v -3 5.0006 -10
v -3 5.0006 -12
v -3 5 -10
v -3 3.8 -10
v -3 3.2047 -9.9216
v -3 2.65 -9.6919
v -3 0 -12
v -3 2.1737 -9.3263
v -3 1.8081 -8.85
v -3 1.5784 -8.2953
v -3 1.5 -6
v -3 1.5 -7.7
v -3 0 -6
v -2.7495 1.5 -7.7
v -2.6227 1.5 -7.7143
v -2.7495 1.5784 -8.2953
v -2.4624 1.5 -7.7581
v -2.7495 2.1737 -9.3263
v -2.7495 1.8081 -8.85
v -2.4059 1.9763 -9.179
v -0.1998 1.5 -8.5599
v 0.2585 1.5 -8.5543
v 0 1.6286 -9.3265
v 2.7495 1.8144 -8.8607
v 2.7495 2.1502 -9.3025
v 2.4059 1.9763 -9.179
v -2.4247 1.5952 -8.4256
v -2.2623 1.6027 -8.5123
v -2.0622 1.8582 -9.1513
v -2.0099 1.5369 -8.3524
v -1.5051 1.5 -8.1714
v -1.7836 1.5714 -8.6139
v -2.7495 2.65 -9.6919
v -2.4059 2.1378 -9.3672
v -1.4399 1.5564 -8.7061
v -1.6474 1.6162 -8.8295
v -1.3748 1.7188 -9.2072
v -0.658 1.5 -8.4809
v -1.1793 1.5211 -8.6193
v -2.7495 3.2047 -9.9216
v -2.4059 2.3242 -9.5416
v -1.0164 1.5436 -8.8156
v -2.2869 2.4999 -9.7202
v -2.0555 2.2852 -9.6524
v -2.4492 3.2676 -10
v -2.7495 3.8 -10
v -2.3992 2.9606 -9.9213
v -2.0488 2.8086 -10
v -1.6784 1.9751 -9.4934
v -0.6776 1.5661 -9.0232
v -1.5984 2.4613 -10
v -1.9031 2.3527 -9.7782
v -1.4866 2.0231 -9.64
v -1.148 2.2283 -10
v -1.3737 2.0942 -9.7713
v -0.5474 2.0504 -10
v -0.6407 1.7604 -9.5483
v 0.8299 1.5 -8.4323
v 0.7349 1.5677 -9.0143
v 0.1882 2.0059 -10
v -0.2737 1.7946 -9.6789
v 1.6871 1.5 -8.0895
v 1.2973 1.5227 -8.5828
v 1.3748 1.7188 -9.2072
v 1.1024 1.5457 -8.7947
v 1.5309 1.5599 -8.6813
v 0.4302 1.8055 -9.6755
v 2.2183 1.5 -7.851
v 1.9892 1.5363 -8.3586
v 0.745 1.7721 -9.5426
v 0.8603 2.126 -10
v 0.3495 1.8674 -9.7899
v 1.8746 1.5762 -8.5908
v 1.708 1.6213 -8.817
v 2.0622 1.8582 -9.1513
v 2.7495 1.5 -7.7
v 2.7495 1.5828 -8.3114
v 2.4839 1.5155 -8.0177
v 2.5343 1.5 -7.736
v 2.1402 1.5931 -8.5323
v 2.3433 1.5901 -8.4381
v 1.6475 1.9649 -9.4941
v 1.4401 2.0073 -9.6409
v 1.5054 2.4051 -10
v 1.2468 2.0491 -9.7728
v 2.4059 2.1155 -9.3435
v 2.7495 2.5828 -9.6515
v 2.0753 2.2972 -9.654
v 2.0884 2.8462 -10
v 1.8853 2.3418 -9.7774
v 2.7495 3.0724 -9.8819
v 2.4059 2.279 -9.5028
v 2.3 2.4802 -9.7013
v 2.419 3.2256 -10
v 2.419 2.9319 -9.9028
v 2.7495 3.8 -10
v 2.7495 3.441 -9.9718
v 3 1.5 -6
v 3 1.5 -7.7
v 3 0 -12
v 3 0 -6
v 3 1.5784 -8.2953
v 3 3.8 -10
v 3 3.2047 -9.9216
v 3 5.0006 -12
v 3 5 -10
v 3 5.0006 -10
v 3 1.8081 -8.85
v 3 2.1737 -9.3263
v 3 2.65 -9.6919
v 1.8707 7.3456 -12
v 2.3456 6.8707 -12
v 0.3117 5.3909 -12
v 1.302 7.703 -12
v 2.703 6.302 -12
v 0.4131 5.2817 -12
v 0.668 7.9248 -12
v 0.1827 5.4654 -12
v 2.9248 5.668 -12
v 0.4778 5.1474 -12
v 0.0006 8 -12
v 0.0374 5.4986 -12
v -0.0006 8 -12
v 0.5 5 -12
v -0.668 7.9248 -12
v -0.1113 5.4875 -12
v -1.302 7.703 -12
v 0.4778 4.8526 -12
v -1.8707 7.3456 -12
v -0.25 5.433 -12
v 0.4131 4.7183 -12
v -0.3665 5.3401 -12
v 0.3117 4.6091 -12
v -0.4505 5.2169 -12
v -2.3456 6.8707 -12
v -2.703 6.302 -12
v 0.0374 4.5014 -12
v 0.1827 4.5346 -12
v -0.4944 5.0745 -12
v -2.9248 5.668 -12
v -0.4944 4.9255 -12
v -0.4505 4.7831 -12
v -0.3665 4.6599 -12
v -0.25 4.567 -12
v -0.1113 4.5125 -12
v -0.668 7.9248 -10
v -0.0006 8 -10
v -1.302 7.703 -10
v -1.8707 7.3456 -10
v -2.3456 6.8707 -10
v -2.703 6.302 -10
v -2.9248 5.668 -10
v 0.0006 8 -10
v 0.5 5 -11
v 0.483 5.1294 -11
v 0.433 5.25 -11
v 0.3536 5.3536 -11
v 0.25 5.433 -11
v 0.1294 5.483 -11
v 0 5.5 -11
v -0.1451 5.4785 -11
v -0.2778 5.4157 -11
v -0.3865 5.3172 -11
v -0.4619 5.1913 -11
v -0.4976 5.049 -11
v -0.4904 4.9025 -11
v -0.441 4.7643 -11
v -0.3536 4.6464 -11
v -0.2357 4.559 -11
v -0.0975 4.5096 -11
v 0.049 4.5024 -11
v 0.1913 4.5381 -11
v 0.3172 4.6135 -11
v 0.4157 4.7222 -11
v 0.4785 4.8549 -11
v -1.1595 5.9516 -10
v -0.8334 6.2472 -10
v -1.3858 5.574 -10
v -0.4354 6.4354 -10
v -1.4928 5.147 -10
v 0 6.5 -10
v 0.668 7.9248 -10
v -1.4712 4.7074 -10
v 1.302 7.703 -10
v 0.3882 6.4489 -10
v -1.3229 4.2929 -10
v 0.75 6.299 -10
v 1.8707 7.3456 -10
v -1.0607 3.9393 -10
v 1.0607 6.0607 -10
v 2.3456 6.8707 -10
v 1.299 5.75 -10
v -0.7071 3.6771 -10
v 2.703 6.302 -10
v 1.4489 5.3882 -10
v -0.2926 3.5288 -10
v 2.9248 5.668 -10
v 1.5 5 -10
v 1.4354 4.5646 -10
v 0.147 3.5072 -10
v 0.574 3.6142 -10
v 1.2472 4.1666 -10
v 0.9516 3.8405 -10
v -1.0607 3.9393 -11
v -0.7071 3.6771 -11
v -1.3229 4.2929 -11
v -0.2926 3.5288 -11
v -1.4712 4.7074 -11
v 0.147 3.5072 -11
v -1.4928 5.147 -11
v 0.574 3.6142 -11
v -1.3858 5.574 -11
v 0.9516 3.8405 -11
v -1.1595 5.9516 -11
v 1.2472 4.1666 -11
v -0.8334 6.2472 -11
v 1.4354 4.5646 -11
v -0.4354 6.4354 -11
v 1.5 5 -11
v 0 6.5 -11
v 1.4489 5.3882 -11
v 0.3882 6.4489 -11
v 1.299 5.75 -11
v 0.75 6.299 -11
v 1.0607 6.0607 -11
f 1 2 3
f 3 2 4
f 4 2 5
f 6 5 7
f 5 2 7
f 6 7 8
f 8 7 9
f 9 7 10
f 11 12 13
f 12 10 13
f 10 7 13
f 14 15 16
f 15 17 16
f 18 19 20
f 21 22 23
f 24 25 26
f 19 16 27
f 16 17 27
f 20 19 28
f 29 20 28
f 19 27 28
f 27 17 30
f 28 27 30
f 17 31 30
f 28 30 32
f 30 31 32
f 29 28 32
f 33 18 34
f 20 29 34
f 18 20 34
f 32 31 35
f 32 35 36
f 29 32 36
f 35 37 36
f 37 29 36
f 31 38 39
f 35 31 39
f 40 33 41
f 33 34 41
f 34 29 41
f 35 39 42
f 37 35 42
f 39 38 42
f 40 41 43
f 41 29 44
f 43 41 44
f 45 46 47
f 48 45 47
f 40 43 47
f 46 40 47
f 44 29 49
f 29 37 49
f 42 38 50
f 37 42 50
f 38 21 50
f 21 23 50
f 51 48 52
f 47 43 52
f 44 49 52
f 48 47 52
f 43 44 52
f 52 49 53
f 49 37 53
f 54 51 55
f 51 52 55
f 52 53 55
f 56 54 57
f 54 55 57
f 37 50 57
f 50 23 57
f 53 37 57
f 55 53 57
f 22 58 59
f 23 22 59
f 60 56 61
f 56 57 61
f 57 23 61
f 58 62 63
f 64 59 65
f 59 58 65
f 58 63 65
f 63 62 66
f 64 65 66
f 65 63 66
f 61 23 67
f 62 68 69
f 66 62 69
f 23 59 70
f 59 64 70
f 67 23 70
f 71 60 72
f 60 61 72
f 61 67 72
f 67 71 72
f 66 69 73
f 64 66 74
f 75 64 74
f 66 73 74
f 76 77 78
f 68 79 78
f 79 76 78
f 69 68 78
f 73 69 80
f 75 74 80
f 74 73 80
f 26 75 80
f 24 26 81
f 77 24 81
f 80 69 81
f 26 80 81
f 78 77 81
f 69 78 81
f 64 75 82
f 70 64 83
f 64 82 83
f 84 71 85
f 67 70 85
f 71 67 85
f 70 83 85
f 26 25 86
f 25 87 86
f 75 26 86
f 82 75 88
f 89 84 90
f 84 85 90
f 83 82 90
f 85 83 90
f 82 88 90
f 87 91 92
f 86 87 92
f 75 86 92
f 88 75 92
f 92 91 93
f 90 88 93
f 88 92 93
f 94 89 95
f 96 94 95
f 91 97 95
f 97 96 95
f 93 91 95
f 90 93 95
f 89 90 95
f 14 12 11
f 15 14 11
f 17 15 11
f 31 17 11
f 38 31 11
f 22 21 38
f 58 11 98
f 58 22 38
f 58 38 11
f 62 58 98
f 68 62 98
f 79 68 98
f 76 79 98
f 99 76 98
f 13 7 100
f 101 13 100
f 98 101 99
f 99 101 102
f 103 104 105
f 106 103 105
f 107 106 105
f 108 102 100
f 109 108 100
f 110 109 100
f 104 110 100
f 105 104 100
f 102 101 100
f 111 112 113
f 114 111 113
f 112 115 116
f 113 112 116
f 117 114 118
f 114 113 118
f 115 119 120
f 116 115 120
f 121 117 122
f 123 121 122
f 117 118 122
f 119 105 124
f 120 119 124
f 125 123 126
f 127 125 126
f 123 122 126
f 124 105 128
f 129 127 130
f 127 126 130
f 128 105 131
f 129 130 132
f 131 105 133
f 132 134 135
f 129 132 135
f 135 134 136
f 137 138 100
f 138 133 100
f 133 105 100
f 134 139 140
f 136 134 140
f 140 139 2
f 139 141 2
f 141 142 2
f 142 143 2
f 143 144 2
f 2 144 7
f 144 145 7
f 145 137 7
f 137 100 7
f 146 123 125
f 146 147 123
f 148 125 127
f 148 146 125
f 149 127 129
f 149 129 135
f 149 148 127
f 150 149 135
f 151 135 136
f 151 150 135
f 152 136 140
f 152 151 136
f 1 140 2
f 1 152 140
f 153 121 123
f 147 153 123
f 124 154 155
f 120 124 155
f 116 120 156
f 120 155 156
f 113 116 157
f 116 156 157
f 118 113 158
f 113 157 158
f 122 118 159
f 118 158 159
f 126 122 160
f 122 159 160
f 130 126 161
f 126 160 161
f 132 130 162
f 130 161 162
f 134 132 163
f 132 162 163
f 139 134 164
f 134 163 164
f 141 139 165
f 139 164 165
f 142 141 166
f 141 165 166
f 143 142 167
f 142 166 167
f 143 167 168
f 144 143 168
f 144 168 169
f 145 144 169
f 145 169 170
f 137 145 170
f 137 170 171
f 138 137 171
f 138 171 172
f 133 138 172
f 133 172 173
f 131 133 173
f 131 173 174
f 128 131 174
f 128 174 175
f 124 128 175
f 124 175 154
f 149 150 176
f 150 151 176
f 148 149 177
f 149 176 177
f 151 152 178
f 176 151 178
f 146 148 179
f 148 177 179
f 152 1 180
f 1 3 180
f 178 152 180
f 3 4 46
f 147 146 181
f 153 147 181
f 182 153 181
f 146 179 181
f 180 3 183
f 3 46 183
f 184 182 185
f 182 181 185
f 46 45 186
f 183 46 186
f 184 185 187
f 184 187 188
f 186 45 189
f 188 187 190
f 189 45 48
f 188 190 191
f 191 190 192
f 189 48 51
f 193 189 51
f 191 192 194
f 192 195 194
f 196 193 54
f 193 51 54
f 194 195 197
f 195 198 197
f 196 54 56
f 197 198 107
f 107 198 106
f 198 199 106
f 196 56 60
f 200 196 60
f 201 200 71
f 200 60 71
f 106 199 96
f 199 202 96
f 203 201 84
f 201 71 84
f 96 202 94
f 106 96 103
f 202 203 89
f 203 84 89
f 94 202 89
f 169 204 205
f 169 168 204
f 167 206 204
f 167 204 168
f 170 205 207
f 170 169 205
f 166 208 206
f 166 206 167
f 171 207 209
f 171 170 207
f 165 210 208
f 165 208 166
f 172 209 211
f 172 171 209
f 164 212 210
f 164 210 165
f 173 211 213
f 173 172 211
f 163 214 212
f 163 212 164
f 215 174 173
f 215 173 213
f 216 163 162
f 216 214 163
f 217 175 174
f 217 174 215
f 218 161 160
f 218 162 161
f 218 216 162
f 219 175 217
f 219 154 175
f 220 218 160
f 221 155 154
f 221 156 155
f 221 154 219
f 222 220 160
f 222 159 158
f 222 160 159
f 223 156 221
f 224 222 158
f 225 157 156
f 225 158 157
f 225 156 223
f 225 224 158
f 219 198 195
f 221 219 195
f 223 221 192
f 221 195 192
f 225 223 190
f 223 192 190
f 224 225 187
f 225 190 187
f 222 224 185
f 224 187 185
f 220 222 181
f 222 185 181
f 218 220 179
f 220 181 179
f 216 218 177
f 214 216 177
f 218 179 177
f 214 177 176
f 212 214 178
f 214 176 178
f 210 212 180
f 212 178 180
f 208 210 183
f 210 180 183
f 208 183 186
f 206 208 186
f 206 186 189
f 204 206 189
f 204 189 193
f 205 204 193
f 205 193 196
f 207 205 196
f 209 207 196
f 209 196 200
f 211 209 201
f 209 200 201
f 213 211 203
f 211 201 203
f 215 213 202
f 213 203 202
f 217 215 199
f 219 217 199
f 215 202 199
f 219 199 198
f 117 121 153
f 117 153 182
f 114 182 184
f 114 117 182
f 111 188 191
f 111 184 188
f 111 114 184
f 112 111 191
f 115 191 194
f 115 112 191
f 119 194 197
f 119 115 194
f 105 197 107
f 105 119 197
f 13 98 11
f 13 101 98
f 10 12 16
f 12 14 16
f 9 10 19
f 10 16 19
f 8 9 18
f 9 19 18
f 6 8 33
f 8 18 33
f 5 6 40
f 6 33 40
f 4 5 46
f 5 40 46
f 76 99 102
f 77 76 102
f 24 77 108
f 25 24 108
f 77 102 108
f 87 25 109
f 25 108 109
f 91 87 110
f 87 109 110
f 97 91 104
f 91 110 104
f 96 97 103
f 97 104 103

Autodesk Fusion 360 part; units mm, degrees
sketch "Sketch1" plane through (0, 0, 0) normal (0, 1, 0) x (1, 0, 0)
  circle A0 centre (0, 0) radius 13
  circle A1 centre (0, 0) radius 3
  line L0 (0, 0) -> (0, 10)
  line L1 (0, 10) -> (3, 10)
  line L2 (3, 10) -> (3, 12)
  line L3 (3, 12) -> (-3, 12)
  line L4 (-3, 12) -> (-3, 10)
  line L5 (-3, 10) -> (3, 10)
  line L6 (-3, 10) -> (3, 10)
  line L7 (3, 10) -> (3, 6)
  line L8 (3, 6) -> (-3, 6)
  line L9 (-3, 6) -> (-3, 10)
  dimension "d1" = 26
  dimension "d2" = 6
extrude "Extrude1" add sketch "Sketch1" along normal blind 1 contours L0 L5 L6 L8 L9 | L0 L1 L5 L6 L7 L8
extrude "Extrude2" add sketch "Sketch1" along normal blind 6 contours L1 L2 L3 L4 L5 L6
extrude "Extrude3" add 1 faces at (-1, 6, -11.3333) along direction (0, 1, 0) blind 1
sketch "Sketch2" plane through (0, 0, -10) normal (0, 0, 1) x (1, 0, 0)
  line L0 (-3, 1) -> (3, 1)
  line L1 (3, 1) -> (3, 7)
  line L2 (3, 7) -> (-3, 7)
  line L3 (-3, 7) -> (-3, 1)
  line L4 (0, 7) -> (0, 5)
  circle A0 centre (0, 5) radius 0.5
  circle A1 centre (0, 5) radius 3
  circle A2 centre (0, 5) radius 1.5
  dimension "d9" = 2
  dimension "d10" = 1
  dimension "d23" = 3
extrude "Extrude4" cut sketch "Sketch2" against normal blind 5.8 contours A0
extrude "Extrude5" add 1 faces at (1, 1, -7.3333) along direction (0, 1, 0) blind 1
extrude "Extrude6" cut 1 faces at (1, 2, -7.3333) along direction (0, -1, 0) blind 0.5
extrude "Extrude7" cut sketch "Sketch2" against normal blind 1 contours A2 | L2 A1 picked at (-0.9591, 6.7853)
fillet "Fillet1" radius 2.3 1 edges at (0, 1.5, -10)
extrude "Extrude8" add 1 faces at (-0.0125, 6.4995, -11) along direction (0, 0, 1) blind 1
extrude "Extrude9" add 1 faces at (-1, 7, -10.6667) along direction (0, 1, 0) blind 1
extrude "Extrude10" cut sketch "Sketch2" against normal blind 1 contours A2
fillet "Fillet2" radius 3 2 edges at (-3, 8, -11) (3, 8, -11)
